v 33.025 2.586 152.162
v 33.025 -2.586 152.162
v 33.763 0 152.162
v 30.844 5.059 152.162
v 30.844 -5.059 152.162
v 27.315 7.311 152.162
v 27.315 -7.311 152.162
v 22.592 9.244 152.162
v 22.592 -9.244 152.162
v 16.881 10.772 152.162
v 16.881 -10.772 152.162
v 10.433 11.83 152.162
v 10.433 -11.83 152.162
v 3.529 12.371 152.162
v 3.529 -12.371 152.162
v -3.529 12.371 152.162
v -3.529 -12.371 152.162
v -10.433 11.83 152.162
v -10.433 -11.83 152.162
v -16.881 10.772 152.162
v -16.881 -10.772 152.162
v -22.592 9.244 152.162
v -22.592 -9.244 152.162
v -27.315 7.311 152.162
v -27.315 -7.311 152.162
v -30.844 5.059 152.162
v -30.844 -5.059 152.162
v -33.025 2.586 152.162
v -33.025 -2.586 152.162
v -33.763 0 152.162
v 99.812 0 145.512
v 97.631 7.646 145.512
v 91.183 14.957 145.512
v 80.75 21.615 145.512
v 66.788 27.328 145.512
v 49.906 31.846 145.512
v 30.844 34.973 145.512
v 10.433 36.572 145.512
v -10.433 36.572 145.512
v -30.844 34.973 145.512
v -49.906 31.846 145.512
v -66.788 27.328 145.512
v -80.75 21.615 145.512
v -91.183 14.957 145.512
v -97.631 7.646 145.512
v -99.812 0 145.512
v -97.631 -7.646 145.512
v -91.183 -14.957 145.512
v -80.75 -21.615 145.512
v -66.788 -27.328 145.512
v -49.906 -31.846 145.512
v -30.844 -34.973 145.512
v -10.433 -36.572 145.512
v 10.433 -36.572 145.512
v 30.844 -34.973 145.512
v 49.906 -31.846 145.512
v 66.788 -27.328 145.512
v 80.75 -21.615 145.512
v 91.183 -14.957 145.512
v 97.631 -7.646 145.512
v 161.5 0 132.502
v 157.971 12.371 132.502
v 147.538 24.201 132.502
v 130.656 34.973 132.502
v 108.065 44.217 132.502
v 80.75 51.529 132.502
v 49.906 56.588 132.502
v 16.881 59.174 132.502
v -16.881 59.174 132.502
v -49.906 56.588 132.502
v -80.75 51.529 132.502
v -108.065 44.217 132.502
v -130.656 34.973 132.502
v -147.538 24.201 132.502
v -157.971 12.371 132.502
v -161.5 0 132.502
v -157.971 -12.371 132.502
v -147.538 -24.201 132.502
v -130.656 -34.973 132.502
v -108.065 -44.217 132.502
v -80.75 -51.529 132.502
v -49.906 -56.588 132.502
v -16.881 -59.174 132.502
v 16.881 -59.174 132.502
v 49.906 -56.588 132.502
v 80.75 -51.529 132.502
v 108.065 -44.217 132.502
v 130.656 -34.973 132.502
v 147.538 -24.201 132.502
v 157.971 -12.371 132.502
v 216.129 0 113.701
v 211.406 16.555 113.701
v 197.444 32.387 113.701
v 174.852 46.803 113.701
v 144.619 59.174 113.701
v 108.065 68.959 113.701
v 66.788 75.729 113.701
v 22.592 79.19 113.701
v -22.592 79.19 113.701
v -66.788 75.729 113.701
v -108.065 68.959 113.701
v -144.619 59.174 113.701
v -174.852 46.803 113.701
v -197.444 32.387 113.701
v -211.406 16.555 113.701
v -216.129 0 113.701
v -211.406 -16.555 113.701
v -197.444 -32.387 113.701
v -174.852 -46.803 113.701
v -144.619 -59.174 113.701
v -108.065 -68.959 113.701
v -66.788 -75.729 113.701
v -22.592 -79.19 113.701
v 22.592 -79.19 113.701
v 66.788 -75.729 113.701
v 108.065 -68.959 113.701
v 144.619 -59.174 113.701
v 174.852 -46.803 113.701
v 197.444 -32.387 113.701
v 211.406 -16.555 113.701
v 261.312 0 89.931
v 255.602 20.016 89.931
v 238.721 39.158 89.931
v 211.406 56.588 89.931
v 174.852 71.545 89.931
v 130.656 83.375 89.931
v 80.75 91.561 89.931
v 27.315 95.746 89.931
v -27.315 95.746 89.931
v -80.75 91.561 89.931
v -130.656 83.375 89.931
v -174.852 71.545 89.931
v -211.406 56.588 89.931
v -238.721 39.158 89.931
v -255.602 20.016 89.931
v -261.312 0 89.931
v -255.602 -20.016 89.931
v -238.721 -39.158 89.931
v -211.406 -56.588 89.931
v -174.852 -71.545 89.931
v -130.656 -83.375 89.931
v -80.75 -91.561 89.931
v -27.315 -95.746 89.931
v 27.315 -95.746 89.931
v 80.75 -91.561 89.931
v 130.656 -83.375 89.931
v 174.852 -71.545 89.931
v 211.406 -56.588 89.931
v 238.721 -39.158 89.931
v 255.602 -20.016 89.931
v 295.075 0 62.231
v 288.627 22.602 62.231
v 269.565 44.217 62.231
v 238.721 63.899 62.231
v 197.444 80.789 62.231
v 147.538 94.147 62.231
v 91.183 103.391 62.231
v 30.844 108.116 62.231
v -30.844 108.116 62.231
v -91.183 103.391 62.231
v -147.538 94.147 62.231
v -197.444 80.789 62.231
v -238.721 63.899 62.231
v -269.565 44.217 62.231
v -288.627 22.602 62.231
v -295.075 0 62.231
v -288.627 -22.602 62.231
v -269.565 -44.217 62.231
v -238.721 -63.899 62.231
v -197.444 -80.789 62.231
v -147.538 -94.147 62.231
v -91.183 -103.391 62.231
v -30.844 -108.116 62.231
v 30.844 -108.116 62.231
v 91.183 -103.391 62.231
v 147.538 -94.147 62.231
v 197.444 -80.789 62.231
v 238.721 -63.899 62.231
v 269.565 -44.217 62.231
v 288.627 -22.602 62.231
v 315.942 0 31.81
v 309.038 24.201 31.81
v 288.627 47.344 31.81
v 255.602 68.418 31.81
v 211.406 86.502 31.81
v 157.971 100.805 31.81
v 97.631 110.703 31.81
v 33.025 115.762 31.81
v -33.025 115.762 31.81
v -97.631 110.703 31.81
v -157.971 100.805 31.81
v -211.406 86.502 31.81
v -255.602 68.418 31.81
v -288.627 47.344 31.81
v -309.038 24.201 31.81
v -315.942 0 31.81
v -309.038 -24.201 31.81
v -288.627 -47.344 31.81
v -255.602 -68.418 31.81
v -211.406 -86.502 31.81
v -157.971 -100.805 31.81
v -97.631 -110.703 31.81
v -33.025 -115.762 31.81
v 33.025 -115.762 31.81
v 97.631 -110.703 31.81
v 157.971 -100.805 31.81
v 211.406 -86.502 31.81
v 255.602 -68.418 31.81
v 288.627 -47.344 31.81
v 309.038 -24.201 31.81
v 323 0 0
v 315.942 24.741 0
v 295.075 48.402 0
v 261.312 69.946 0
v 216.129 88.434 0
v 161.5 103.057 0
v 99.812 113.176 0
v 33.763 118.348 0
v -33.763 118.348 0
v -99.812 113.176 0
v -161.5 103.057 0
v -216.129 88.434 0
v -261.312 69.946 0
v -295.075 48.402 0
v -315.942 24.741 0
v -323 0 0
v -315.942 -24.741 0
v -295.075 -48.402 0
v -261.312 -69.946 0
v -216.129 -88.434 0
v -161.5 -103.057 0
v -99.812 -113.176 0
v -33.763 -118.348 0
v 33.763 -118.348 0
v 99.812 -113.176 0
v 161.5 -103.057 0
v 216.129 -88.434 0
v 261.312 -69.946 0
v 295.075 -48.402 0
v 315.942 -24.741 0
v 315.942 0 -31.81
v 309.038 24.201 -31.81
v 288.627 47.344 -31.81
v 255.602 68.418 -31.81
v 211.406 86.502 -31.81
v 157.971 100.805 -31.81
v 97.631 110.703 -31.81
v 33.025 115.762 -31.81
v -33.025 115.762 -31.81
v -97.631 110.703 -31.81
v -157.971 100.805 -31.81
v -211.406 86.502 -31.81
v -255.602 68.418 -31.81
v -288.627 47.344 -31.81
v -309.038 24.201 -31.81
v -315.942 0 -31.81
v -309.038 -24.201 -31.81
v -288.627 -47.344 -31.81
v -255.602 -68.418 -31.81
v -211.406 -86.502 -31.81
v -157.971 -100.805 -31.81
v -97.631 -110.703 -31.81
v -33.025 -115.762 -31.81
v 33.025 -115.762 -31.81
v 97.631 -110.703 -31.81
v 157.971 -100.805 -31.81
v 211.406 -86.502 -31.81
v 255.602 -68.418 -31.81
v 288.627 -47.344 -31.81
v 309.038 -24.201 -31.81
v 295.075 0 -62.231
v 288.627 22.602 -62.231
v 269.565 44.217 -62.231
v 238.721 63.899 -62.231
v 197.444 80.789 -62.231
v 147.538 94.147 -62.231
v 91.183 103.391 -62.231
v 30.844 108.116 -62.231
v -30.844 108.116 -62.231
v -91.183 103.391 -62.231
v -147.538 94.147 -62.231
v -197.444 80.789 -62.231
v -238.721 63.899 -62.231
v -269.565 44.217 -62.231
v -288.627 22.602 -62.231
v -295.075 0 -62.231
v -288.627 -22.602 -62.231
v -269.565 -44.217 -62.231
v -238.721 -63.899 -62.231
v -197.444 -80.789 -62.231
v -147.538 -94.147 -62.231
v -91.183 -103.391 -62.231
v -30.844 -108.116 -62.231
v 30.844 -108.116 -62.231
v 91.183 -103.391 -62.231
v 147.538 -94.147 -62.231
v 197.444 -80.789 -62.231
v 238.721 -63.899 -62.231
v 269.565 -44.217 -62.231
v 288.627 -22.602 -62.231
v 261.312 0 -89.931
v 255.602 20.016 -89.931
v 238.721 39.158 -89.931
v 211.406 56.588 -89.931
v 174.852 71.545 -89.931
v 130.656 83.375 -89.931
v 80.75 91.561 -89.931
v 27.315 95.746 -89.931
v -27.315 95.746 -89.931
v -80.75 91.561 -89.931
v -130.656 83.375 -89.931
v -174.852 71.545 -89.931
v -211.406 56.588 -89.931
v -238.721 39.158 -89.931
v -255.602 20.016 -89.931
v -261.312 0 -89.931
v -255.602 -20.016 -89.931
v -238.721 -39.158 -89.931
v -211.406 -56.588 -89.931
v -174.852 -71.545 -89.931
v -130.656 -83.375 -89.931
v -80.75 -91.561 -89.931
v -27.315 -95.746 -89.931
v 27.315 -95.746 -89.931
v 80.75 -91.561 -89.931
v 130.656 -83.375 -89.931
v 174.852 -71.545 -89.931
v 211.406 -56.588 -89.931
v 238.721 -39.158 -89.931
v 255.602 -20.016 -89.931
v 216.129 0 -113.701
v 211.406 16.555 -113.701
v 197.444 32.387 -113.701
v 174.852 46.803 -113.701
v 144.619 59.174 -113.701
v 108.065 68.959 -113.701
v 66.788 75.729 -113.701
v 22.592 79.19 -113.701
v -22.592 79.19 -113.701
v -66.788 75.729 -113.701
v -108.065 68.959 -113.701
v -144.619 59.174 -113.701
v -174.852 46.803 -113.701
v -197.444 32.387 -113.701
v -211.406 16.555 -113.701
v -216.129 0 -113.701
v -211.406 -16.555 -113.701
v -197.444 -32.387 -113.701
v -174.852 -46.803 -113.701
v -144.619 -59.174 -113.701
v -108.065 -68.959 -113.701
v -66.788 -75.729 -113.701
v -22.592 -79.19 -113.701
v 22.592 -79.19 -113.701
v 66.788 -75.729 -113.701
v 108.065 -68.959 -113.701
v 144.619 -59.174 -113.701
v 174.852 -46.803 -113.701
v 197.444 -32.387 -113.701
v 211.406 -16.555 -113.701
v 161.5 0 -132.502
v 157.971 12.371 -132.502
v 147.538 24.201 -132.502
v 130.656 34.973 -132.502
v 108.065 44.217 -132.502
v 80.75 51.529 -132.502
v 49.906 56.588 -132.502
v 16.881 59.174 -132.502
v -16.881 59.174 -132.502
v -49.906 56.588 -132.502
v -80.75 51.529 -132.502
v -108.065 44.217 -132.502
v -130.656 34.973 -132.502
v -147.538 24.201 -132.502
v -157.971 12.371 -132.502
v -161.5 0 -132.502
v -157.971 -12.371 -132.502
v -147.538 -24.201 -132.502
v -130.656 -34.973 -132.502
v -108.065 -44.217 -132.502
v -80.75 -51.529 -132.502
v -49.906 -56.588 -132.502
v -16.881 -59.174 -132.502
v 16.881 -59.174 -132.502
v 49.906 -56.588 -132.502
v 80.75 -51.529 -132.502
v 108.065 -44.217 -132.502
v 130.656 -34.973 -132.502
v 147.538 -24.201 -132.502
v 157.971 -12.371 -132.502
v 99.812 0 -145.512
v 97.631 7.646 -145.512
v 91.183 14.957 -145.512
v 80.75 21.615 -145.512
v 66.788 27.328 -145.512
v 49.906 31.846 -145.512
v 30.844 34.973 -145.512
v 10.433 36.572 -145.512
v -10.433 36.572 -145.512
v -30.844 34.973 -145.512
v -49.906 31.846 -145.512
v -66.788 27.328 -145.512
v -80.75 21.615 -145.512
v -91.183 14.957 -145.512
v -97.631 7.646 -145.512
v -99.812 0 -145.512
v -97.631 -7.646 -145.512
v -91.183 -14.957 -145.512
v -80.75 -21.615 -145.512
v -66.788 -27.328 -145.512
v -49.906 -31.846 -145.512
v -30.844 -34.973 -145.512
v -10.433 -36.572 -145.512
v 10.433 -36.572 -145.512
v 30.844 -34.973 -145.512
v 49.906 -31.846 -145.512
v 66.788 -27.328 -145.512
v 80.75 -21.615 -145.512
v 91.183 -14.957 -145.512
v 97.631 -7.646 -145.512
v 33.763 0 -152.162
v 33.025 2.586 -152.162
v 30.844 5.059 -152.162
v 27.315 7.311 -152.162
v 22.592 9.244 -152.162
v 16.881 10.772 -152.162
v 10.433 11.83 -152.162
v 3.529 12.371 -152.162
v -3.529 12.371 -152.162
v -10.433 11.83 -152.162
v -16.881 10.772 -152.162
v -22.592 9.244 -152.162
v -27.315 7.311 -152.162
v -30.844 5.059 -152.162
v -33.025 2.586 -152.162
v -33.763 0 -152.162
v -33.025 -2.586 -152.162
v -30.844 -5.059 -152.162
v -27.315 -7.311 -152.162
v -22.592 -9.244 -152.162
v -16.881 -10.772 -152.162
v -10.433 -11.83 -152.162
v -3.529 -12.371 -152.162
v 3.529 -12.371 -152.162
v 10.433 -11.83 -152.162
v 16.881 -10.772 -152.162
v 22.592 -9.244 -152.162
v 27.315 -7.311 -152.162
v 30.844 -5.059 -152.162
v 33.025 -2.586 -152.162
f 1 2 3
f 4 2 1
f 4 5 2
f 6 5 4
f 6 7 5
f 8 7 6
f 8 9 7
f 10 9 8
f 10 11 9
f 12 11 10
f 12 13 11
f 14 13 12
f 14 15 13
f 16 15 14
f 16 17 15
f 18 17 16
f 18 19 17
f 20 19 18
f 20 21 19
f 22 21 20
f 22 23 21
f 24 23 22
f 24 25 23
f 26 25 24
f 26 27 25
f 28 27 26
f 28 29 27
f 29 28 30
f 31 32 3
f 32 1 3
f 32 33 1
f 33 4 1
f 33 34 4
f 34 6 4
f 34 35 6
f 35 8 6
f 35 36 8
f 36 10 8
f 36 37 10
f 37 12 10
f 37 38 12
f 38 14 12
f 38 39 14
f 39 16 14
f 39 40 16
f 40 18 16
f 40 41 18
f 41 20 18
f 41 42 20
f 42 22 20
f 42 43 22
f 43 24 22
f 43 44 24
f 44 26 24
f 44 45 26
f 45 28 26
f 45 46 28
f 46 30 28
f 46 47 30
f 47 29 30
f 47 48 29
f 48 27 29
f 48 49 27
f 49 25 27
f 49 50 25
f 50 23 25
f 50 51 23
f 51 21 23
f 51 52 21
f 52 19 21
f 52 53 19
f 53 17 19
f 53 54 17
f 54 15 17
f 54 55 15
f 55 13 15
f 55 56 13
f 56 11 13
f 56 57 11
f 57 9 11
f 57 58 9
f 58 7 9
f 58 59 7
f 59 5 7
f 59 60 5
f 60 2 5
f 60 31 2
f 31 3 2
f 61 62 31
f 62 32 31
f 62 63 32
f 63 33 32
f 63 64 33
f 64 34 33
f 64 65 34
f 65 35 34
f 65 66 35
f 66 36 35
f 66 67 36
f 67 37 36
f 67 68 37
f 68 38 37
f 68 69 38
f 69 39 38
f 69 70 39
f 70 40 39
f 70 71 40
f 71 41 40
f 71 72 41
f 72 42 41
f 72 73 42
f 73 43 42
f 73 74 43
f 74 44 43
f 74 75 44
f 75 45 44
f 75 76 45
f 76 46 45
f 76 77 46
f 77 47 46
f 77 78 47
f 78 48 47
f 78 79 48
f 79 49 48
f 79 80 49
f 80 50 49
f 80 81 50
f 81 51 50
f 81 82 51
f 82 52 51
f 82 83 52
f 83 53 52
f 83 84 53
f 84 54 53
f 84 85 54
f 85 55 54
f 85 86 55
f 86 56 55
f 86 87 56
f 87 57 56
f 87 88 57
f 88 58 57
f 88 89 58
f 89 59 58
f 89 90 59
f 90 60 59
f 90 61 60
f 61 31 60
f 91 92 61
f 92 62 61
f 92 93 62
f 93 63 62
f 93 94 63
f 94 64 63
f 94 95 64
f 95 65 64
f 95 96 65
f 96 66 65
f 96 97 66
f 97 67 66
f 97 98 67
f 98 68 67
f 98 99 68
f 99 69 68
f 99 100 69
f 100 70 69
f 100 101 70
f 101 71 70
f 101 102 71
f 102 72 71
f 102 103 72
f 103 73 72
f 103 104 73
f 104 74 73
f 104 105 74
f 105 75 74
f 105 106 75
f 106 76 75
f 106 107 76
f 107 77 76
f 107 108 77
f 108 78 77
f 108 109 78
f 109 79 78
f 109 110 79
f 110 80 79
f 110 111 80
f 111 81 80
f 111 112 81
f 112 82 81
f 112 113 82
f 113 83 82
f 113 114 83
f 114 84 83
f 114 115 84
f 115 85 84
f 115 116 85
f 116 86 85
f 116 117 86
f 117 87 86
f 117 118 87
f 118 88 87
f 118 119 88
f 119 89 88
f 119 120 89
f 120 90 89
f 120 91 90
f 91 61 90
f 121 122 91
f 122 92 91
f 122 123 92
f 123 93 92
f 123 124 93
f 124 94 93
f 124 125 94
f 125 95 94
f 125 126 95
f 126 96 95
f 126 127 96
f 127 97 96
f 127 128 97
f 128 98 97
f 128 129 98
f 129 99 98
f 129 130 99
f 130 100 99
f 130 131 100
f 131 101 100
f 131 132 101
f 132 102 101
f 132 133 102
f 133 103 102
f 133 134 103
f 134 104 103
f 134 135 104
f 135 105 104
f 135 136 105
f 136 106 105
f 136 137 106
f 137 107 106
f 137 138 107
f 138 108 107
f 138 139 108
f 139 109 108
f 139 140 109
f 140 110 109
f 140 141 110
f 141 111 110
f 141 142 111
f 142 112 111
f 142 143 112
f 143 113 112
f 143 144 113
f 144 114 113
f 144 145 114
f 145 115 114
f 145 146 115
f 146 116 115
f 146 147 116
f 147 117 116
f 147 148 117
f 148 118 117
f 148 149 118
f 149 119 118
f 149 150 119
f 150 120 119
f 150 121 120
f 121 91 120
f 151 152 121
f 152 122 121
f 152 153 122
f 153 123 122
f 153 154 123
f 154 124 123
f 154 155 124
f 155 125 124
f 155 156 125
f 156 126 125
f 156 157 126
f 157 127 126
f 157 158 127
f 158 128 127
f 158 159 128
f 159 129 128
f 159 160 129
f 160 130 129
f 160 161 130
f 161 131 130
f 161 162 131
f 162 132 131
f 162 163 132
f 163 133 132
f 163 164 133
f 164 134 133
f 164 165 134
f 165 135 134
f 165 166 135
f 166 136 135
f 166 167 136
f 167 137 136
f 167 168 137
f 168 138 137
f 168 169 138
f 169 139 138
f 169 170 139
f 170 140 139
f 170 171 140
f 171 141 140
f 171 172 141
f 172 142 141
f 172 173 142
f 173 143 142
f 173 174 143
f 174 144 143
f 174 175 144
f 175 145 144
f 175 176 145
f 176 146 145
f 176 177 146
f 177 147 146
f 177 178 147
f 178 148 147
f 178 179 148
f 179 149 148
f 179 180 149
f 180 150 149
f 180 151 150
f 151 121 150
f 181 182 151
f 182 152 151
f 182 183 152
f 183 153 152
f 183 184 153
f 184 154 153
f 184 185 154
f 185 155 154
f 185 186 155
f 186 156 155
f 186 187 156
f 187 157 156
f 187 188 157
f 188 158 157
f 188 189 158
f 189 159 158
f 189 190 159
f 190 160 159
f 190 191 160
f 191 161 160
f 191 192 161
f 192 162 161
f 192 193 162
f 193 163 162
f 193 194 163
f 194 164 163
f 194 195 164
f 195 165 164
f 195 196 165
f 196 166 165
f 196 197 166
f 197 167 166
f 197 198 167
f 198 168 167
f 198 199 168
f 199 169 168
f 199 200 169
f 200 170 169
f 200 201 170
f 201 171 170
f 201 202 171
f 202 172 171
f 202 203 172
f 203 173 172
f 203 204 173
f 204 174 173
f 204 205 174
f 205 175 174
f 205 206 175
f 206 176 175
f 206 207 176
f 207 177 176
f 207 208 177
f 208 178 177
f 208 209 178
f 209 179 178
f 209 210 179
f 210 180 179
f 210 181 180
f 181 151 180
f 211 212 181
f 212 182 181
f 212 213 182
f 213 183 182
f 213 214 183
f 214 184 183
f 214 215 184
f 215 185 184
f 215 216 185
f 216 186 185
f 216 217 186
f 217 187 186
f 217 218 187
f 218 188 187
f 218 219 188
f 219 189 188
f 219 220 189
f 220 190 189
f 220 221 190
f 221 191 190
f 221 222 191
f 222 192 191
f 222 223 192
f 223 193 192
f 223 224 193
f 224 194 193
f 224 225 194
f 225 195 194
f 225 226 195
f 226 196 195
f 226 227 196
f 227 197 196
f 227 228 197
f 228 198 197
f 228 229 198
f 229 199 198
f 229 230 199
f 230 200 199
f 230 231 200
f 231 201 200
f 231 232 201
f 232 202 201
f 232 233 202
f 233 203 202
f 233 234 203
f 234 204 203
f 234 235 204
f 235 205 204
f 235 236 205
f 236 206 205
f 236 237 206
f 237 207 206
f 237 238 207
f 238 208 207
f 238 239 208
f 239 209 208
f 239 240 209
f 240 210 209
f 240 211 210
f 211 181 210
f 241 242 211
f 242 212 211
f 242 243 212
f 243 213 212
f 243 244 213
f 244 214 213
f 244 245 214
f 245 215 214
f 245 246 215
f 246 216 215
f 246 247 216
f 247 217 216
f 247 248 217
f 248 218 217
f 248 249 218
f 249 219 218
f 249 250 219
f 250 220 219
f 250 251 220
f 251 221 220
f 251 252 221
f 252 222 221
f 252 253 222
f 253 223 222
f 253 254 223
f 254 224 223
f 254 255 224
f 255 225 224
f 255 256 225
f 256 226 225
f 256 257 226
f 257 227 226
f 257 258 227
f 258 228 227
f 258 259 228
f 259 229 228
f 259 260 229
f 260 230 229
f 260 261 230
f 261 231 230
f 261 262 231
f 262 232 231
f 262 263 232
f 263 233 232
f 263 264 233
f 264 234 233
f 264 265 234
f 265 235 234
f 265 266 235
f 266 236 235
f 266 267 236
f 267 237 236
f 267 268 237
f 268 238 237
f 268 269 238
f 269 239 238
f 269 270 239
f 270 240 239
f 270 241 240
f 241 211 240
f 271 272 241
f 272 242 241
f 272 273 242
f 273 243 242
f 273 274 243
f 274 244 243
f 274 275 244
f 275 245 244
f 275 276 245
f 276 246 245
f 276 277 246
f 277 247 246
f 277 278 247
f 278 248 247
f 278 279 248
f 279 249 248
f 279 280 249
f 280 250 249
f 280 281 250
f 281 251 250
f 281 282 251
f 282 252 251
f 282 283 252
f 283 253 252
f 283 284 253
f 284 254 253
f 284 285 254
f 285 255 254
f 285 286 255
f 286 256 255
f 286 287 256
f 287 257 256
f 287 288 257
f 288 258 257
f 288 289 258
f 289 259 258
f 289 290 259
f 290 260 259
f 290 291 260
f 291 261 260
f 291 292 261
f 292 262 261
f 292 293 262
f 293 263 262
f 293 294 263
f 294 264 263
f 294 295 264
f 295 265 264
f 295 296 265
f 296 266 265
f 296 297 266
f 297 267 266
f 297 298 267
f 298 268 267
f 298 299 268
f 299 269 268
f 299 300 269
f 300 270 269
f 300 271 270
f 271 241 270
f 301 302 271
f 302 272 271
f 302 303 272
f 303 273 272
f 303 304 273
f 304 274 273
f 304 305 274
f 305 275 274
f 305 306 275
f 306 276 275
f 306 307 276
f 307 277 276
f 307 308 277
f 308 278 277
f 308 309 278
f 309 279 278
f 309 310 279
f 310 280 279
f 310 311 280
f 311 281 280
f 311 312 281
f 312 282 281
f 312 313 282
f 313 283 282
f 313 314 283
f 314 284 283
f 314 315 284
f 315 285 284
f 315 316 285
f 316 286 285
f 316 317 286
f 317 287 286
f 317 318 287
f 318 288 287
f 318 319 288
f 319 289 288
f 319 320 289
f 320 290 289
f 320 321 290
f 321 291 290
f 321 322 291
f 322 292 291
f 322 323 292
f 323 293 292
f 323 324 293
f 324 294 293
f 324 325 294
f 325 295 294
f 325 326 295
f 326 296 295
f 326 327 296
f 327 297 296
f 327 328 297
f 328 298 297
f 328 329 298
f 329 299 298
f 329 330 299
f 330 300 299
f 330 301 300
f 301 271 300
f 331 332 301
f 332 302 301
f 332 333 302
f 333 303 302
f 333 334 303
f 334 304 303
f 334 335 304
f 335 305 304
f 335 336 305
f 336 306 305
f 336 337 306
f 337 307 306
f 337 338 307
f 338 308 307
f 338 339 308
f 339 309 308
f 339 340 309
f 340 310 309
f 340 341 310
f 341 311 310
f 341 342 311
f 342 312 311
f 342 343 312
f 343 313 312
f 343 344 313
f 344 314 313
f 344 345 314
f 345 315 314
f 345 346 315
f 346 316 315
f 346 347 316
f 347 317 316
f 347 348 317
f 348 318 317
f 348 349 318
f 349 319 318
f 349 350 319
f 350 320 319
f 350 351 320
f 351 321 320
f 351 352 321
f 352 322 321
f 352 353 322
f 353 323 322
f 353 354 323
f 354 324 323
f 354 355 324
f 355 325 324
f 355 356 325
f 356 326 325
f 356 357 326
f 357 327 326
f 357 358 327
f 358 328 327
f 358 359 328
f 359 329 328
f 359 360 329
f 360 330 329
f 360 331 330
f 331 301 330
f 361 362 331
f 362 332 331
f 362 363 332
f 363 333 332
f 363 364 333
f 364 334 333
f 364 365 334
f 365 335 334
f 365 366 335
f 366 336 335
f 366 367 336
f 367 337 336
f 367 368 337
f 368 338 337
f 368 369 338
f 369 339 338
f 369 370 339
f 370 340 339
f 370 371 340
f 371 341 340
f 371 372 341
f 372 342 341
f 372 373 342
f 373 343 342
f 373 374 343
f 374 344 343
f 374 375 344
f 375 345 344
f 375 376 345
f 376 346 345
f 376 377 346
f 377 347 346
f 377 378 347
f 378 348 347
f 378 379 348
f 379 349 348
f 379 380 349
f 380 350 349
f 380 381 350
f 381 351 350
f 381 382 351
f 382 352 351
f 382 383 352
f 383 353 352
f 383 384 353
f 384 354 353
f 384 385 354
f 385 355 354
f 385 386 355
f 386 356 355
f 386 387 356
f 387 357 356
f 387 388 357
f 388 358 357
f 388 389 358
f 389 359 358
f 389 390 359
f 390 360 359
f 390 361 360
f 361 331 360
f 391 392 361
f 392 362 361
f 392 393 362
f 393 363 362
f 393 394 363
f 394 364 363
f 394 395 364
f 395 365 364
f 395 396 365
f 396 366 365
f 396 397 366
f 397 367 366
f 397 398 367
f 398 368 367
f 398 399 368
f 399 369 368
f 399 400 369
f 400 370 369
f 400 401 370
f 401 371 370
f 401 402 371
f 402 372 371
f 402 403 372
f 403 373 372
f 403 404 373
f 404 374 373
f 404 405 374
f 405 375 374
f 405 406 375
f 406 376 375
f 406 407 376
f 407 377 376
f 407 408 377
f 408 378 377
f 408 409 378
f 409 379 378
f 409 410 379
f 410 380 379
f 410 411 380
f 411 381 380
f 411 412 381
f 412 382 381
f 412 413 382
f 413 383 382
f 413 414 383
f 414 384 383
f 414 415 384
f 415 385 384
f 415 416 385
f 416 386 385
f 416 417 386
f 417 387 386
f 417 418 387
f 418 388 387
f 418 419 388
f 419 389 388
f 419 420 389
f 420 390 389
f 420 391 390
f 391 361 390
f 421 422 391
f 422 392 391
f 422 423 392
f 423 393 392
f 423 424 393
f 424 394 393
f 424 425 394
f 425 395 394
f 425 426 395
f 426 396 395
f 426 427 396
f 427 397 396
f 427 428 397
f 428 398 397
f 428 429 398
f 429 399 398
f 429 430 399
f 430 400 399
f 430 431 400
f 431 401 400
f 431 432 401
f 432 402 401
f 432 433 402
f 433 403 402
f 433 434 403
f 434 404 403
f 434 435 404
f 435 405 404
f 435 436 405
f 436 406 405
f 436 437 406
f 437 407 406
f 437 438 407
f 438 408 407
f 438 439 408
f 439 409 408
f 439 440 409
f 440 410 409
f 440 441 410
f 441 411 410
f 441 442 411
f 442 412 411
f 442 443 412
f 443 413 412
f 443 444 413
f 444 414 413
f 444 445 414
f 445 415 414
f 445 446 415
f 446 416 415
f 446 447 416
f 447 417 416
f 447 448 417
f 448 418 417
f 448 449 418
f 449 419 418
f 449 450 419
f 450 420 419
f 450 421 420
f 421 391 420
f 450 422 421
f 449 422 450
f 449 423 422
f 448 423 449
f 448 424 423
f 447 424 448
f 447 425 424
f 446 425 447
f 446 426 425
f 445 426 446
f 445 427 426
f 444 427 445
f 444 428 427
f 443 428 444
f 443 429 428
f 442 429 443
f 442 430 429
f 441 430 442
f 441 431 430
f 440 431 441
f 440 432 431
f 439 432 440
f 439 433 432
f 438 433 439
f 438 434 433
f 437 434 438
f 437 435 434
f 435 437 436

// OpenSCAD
// Generated by SolidPython 1.0.1 on 2020-07-29 00:46:53


scale(v = [19, 7, 9]) {
	sphere(r = 17);
}
/***********************************************
*********      SolidPython code:      **********
************************************************
 
# import packages: SolidPython
from solid import *
from solid.utils import *
from itertools import chain, combinations, permutations


class Resize:

    def __init__(self, scad_file):
        self.scad_file = scad_file
        #self.scad_file = import_scad(scad_file)
        # cone/cylinder param:
        self.r1 = 0
        self.r2 = 0
        self.h = 0
        # rectangular prism param:
        self.w = 0
        self.l = 0
        # ellipse param:
        self.r = 0

    # import OpenScad code (file name corresponds to shape)


    # classify shape + parameters
    def assign(self, param1, param2, param3):
        if self.scad_file == 'cone.scad':
            self.r1 = param1
            self.r2 = param2
            self.h = param3
        elif self.scad_file == 'cylinder.scad':
            self.r1 = param1
            self.r2 = param2
            self.h = param3
        elif self.scad_file == 'rectangularPrism.scad':
            self.h = param1
            self.l = param2
            self.w = param3
        else:
            self.r = param1
            self.h = param2

    # resize parameters
    def iterate(self):
        x = range(3, 20, 2)
        i = 1
        if self.scad_file == 'cone.scad':
            tempList = list(permutations(x, 2))
            for temp in tempList:
                param1 = temp[0]
                param2 = temp[1]
                filepath = 'produced_scad_files/' + 'cone' + str(param1) + '_' + str(param2) + '_' + '.scad'
                scad_render_to_file(cylinder(h=param1, r1=param2, r2=0), filepath)

        elif self.scad_file == 'cylinder.scad':
            tempList = list(permutations(x, 3))
            for temp in tempList:
                param1 = temp[0]
                param2 = temp[1]
                filepath = 'produced_scad_files/' + 'cylinder' + str(param1) + '_' + str(param2) + '_' + '.scad'
                scad_render_to_file(cylinder(h=param1, r1=param2, r2=param2), filepath)

        elif self.scad_file == 'rectangularPrism.scad':
            tempList = list(permutations(x, 3))
            for temp in tempList:
                param1 = temp[0]
                param2 = temp[1]
                param3 = temp[2]
                filepath = 'produced_scad_files/' + 'rectangularPrism' + str(param1) + '_' + str(param2) + '_' + str(
                    param3) + '.scad'
                scad_render_to_file(cube(size=(param1, param2, param3)), filepath)

        elif self.scad_file == 'ellipse.scad':
            tempList = list(permutations(x, 4))
            for temp in tempList:
                param1 = temp[0]
                param2 = temp[1]
                param3 = temp[2]
                param4 = temp[3]
                filepath = 'produced_scad_files/' + 'ellipse' + str(param1) + '_' + str(param2) + '_' + str(param3) + '_' + str(param4) + '.scad'
                scad_render_to_file(scale([param1, param2, param3])(sphere(r=param4)), filepath)

    def render_to_scadfile(self):
        scad_render_to_file(scad, 'example.scad') 
 
************************************************/
